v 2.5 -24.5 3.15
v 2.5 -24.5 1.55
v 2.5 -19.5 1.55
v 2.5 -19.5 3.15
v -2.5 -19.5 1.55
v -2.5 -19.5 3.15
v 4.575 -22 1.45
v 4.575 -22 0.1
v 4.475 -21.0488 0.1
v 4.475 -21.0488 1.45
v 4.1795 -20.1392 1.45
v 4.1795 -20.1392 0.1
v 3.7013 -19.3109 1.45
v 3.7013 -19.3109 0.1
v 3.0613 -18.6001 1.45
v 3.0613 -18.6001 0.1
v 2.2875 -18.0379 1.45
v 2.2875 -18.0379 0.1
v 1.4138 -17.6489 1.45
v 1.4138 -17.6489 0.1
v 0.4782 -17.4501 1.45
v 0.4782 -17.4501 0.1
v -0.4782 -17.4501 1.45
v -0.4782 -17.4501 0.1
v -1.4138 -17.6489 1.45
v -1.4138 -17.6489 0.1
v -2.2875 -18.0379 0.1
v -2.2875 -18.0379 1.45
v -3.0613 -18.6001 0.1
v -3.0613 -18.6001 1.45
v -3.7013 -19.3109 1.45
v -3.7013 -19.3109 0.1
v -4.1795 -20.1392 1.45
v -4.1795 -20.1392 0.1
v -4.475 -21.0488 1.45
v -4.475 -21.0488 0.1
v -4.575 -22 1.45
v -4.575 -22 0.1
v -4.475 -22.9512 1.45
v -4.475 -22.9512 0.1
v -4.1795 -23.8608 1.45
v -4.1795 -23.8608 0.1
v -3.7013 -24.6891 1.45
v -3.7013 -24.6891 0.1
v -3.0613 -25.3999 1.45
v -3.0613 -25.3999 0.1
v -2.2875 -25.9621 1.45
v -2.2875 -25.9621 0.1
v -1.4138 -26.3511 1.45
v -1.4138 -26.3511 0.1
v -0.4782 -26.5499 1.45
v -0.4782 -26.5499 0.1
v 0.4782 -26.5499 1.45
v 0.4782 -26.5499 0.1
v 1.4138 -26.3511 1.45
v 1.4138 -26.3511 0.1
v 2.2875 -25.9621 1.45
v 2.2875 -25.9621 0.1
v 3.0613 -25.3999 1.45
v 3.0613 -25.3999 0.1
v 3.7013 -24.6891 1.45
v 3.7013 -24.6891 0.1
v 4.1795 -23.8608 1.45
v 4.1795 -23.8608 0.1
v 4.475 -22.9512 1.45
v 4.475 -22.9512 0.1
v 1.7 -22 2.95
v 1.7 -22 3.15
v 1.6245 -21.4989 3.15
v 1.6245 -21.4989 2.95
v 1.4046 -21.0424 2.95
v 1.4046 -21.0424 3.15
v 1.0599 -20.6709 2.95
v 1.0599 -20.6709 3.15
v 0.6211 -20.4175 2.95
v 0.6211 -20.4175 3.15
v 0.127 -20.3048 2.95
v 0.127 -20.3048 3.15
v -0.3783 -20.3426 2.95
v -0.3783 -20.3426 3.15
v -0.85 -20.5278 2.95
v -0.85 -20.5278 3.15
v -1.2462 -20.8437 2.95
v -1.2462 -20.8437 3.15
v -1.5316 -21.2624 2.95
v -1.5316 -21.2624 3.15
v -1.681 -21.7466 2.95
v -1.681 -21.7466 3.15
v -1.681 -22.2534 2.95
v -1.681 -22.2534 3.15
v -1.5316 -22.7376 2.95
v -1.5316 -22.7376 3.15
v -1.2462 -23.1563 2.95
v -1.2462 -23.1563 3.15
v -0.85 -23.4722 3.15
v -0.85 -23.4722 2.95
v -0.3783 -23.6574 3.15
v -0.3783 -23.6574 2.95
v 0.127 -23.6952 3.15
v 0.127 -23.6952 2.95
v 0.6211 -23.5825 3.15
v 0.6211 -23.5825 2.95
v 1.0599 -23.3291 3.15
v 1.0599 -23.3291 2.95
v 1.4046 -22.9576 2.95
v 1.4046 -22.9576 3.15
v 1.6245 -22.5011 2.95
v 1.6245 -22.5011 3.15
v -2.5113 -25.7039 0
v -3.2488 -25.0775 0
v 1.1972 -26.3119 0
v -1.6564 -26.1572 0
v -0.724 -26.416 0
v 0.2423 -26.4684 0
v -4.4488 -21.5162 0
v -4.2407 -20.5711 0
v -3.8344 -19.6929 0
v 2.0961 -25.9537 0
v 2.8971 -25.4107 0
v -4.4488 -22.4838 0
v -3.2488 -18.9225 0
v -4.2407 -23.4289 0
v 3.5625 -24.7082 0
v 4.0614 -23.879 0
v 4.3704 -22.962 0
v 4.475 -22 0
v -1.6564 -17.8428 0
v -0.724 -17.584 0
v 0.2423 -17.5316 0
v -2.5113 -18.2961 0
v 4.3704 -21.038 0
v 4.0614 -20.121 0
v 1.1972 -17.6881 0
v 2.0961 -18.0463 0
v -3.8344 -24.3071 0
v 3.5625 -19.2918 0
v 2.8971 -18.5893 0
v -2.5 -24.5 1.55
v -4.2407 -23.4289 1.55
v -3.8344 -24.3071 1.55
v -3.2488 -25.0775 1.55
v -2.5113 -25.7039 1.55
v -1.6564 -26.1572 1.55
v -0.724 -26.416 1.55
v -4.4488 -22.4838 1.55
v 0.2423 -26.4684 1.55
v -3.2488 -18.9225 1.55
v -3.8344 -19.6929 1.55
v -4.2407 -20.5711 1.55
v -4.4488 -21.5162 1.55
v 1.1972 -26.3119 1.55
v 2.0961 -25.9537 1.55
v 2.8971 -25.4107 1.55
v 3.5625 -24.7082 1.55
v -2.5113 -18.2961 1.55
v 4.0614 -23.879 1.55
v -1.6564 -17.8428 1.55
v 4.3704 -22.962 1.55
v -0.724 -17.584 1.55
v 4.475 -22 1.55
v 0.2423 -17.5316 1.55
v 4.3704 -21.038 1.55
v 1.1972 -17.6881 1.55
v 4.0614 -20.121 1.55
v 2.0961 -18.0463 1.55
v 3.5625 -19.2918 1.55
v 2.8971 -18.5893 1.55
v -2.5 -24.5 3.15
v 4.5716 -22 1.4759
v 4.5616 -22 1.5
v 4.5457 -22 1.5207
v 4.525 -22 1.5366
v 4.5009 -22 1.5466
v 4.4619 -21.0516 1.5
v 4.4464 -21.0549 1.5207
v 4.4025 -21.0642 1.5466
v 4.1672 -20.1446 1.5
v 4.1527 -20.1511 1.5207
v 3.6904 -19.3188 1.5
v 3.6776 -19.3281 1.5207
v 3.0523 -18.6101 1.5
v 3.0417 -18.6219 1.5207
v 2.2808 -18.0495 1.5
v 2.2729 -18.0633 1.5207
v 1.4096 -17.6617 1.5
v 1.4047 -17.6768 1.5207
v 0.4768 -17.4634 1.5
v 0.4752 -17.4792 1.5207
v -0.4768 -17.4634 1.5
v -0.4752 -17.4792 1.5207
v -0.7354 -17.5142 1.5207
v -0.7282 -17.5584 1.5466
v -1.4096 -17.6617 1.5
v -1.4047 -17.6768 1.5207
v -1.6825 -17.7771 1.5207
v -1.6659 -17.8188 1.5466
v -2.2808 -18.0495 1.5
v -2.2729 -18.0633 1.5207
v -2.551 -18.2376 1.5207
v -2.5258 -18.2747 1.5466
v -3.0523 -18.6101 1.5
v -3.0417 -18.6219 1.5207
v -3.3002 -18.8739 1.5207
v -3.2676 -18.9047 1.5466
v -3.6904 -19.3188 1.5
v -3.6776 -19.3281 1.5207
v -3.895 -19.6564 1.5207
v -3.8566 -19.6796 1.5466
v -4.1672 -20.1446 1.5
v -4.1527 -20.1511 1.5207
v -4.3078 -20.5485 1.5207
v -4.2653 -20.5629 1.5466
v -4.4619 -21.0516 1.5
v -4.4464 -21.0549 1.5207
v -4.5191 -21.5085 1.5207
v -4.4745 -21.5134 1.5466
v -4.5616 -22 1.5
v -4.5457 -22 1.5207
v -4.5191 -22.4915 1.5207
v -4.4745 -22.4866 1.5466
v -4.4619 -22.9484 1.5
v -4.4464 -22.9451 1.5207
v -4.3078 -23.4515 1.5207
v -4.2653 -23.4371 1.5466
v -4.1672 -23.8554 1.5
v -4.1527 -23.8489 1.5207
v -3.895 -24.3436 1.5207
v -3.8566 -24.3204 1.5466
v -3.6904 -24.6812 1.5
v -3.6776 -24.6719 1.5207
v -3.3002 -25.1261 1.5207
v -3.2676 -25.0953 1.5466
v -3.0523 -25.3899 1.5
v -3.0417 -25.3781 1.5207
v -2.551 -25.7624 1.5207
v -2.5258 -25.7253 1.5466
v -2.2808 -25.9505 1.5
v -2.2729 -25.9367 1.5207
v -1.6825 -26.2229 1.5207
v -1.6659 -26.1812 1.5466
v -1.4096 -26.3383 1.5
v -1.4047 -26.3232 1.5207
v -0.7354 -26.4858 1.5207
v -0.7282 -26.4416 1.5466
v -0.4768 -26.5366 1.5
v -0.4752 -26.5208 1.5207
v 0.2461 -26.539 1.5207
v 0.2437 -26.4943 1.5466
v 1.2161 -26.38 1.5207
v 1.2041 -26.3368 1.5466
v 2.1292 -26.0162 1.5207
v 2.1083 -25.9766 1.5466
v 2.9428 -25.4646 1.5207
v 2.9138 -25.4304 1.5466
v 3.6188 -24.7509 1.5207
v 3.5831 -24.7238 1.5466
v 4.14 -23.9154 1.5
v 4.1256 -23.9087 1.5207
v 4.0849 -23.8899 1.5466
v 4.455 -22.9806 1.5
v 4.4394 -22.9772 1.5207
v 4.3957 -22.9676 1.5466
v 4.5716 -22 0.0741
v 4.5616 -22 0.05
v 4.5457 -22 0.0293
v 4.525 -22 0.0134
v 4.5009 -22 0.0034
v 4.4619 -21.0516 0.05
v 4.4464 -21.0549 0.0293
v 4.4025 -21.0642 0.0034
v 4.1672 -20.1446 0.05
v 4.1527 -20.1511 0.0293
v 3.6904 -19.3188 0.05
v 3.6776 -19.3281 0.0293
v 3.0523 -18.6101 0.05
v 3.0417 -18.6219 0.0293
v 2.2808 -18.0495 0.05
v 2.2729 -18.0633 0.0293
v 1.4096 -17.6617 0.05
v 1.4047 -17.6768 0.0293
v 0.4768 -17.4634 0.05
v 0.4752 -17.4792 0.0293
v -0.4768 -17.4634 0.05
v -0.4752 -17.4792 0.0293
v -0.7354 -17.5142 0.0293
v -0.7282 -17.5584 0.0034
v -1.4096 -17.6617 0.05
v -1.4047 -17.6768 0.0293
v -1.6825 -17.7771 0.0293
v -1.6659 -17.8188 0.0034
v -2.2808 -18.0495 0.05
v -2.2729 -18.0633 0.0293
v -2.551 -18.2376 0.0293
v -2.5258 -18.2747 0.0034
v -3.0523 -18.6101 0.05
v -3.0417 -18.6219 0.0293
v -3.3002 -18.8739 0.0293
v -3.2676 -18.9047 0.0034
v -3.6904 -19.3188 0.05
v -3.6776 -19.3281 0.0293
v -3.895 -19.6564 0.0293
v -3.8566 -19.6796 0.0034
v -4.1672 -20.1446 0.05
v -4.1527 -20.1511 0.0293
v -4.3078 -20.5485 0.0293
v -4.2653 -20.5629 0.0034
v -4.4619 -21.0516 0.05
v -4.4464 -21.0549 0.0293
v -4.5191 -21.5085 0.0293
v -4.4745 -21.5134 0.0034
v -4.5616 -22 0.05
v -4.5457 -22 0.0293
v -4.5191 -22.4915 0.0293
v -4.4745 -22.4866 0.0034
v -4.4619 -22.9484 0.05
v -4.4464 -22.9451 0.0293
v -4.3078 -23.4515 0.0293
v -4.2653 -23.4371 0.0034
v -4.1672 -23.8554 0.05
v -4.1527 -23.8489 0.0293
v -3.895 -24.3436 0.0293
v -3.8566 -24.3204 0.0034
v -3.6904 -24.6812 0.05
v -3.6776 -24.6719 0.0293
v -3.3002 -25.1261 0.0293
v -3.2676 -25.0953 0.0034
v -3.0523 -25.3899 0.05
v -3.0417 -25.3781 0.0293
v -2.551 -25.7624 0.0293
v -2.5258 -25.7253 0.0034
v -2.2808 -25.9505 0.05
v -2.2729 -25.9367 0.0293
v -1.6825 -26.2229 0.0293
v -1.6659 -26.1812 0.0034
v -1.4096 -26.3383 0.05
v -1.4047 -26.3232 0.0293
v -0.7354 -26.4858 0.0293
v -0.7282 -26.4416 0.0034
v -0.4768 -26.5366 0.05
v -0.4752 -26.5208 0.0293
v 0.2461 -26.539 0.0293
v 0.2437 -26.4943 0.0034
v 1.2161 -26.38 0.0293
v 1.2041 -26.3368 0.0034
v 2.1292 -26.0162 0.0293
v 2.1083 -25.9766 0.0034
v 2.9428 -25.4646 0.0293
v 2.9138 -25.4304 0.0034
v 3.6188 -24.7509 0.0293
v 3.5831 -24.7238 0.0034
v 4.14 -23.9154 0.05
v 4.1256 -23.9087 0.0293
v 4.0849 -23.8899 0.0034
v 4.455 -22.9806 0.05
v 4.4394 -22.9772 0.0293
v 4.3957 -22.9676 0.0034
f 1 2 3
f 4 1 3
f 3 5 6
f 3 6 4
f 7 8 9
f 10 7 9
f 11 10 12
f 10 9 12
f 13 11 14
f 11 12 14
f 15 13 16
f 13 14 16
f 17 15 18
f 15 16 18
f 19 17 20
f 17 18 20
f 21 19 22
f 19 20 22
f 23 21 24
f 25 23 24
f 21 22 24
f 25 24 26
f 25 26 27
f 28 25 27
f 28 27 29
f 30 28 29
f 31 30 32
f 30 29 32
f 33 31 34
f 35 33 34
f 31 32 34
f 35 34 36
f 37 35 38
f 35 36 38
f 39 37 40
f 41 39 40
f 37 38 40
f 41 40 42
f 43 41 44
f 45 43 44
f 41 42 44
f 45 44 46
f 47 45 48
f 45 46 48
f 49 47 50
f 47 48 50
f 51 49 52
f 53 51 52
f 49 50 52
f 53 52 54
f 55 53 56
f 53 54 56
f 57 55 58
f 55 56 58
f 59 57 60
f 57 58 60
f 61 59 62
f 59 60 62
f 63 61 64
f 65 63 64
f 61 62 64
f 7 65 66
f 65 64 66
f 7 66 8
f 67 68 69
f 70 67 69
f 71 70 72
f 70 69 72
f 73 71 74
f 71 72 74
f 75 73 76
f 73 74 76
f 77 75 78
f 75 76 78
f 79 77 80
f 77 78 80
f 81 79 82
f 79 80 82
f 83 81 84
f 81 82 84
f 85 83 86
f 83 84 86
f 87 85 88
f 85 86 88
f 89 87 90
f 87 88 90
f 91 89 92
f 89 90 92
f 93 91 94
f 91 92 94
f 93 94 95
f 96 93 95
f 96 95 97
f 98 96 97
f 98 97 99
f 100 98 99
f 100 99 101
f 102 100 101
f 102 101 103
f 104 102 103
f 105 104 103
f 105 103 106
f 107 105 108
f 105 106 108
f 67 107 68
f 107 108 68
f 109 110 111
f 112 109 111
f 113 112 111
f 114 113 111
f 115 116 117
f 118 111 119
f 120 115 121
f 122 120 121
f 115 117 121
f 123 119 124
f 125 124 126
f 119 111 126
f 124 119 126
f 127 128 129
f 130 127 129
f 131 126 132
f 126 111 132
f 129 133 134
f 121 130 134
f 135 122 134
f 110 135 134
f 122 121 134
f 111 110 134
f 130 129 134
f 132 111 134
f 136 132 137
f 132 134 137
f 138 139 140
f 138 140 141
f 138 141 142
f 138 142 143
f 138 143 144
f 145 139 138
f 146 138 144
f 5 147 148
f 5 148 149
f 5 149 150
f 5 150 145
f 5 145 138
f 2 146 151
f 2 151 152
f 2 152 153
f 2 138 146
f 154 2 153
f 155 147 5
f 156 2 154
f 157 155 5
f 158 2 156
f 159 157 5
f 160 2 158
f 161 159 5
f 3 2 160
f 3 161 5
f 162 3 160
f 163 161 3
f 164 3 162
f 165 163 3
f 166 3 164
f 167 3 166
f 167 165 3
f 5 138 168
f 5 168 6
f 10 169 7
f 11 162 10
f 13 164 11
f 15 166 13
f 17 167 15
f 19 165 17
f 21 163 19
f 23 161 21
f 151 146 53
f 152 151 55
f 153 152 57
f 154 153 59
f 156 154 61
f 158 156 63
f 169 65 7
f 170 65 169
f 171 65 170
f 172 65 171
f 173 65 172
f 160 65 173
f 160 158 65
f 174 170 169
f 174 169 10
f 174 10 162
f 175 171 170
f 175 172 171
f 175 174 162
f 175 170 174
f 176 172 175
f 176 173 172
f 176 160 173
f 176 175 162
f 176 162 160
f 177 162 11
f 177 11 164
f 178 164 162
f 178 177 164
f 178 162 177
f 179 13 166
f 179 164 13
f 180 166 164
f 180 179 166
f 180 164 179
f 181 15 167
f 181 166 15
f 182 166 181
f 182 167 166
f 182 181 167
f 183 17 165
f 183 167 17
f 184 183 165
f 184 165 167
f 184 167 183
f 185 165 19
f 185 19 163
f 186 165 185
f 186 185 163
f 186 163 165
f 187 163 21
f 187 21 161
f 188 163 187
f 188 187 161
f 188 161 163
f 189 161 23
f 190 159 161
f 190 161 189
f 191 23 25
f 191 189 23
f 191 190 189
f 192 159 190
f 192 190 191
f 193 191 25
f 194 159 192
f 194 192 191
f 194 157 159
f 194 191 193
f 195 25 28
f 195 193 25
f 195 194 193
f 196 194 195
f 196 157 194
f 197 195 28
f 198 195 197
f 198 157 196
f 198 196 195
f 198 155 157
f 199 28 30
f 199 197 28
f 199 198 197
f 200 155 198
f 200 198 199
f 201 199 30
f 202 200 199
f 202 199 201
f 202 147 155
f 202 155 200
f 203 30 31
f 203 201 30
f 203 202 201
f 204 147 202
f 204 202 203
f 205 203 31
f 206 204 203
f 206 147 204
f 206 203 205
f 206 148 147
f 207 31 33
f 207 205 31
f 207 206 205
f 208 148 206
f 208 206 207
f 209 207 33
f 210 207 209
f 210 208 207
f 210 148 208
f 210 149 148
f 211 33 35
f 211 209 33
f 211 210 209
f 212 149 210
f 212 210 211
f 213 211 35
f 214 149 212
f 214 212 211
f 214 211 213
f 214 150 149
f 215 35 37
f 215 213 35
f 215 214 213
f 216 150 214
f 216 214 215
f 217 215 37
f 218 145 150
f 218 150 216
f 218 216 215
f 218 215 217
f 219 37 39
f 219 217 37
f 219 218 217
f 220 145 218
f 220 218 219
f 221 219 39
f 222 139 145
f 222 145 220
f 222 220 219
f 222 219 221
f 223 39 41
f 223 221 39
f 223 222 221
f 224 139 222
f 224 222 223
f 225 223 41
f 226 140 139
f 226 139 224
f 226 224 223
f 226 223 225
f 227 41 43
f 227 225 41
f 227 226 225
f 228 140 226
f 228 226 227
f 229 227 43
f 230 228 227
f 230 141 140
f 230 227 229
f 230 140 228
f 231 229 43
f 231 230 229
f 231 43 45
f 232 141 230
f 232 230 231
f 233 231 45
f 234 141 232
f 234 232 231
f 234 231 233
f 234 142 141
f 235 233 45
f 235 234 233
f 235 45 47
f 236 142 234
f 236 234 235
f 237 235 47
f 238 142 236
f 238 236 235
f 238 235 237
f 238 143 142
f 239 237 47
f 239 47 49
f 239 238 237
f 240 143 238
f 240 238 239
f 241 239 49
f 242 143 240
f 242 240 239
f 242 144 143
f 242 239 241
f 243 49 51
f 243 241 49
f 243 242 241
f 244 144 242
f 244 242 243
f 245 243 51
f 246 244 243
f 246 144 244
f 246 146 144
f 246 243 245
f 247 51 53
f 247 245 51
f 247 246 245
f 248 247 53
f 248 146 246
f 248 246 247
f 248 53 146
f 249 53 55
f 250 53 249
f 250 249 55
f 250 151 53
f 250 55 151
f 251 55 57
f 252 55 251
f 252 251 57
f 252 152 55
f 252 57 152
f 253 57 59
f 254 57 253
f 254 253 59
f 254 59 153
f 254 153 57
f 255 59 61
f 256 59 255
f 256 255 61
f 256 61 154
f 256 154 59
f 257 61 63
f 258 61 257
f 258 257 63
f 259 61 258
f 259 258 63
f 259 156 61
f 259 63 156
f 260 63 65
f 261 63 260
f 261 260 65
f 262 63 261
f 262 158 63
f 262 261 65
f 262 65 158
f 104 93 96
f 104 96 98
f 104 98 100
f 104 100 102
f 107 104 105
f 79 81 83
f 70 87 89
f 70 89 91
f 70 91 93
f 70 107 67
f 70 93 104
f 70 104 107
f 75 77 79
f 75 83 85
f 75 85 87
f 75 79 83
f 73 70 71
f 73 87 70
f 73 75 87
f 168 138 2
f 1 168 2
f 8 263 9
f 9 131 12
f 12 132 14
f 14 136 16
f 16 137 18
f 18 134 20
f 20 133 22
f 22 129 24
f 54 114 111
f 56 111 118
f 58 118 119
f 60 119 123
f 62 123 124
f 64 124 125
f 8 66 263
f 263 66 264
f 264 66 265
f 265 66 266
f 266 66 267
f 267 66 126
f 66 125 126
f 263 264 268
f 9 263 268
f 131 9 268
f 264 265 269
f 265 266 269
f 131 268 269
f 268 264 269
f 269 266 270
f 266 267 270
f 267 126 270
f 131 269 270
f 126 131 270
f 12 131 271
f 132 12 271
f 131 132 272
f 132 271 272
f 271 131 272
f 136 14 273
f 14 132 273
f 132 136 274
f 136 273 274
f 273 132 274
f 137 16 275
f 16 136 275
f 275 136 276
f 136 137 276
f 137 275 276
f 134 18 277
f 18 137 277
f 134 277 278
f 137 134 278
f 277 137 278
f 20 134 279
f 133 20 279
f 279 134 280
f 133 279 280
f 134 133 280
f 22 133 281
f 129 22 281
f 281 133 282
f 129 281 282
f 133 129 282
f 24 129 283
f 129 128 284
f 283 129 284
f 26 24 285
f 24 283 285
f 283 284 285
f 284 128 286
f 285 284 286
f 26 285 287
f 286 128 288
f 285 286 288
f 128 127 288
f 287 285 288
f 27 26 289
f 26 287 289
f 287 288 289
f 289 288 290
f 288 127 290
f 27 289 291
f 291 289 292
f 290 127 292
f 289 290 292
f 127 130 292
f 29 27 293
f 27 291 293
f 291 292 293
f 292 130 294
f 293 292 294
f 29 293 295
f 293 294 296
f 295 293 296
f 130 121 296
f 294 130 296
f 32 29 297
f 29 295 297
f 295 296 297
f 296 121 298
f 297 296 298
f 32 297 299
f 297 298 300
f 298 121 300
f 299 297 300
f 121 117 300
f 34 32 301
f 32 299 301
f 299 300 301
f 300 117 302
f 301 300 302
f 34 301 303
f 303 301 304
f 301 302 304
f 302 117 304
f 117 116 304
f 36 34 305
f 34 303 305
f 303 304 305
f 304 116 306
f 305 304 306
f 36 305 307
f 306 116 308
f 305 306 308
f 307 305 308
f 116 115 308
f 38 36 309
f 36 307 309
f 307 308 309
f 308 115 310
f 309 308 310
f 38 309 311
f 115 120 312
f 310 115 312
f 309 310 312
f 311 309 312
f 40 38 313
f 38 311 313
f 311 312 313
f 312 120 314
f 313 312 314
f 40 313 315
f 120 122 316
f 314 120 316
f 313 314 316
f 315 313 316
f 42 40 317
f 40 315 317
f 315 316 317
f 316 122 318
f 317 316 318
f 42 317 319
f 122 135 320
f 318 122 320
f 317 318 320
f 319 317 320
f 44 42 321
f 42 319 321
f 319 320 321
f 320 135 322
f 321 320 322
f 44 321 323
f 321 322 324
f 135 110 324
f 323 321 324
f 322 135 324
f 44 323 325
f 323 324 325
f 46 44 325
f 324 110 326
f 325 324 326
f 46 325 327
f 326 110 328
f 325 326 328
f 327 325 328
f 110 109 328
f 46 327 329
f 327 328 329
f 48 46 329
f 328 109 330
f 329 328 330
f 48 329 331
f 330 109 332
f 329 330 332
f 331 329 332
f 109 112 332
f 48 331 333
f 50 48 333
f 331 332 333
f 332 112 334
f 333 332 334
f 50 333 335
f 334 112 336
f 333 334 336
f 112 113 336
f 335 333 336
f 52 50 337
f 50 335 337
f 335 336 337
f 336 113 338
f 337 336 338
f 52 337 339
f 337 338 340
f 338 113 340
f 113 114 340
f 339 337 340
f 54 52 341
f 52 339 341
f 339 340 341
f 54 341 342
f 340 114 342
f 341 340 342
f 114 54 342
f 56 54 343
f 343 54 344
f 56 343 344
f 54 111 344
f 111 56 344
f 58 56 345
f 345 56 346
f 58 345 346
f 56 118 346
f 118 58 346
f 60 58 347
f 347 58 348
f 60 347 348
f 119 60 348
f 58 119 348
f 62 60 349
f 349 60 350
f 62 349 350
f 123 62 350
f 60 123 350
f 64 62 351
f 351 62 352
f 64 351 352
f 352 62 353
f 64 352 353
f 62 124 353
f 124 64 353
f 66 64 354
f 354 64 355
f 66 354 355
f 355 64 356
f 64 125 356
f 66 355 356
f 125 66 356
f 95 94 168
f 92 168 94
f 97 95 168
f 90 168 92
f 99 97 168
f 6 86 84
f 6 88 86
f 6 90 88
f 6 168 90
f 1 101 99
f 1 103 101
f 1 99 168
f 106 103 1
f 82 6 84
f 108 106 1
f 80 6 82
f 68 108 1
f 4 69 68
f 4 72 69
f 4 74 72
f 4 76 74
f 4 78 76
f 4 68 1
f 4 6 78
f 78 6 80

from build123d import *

# Parameters (mm, degrees)
SKETCH005_R     = 4.575
PAD002_DEPTH    = 1.55
SKETCH004_W     = 5
SKETCH004_H     = 5
PAD003_DEPTH    = 1.6
SKETCH006_R     = 1.7
POCKET001_DEPTH = 0.2
FILLET001_R     = 0.1


with BuildPart() as part:
    # Sketch005 → Pad002 (new body)
    with BuildSketch(Plane.XY):
        Circle(SKETCH005_R)
    extrude(amount=PAD002_DEPTH)

    # Sketch004 (on Face3 of Pad002) → Pad003 (join)
    with BuildSketch(Plane.XY.offset(1.55)):
        Rectangle(SKETCH004_W, SKETCH004_H)
    extrude(amount=PAD003_DEPTH)

    # Sketch006 (on Face8 of Pad003) → Pocket001 (cut)
    with BuildSketch(Plane.XY.offset(3.15)):
        Circle(SKETCH006_R)
    extrude(amount=-POCKET001_DEPTH, mode=Mode.SUBTRACT)

    # Fillet001
    fillet001_edges = [part.edges().sort_by_distance(p)[0] for p in [
        (-4.575, 0, 0),
        (-4.575, 0, 1.55),
    ]]
    fillet(fillet001_edges, radius=FILLET001_R)


with BuildPart() as part_1:
    # Body002 placement: moved
    add(part.part.moved(Location((0, -22, 0))))


solid = part_1.part
